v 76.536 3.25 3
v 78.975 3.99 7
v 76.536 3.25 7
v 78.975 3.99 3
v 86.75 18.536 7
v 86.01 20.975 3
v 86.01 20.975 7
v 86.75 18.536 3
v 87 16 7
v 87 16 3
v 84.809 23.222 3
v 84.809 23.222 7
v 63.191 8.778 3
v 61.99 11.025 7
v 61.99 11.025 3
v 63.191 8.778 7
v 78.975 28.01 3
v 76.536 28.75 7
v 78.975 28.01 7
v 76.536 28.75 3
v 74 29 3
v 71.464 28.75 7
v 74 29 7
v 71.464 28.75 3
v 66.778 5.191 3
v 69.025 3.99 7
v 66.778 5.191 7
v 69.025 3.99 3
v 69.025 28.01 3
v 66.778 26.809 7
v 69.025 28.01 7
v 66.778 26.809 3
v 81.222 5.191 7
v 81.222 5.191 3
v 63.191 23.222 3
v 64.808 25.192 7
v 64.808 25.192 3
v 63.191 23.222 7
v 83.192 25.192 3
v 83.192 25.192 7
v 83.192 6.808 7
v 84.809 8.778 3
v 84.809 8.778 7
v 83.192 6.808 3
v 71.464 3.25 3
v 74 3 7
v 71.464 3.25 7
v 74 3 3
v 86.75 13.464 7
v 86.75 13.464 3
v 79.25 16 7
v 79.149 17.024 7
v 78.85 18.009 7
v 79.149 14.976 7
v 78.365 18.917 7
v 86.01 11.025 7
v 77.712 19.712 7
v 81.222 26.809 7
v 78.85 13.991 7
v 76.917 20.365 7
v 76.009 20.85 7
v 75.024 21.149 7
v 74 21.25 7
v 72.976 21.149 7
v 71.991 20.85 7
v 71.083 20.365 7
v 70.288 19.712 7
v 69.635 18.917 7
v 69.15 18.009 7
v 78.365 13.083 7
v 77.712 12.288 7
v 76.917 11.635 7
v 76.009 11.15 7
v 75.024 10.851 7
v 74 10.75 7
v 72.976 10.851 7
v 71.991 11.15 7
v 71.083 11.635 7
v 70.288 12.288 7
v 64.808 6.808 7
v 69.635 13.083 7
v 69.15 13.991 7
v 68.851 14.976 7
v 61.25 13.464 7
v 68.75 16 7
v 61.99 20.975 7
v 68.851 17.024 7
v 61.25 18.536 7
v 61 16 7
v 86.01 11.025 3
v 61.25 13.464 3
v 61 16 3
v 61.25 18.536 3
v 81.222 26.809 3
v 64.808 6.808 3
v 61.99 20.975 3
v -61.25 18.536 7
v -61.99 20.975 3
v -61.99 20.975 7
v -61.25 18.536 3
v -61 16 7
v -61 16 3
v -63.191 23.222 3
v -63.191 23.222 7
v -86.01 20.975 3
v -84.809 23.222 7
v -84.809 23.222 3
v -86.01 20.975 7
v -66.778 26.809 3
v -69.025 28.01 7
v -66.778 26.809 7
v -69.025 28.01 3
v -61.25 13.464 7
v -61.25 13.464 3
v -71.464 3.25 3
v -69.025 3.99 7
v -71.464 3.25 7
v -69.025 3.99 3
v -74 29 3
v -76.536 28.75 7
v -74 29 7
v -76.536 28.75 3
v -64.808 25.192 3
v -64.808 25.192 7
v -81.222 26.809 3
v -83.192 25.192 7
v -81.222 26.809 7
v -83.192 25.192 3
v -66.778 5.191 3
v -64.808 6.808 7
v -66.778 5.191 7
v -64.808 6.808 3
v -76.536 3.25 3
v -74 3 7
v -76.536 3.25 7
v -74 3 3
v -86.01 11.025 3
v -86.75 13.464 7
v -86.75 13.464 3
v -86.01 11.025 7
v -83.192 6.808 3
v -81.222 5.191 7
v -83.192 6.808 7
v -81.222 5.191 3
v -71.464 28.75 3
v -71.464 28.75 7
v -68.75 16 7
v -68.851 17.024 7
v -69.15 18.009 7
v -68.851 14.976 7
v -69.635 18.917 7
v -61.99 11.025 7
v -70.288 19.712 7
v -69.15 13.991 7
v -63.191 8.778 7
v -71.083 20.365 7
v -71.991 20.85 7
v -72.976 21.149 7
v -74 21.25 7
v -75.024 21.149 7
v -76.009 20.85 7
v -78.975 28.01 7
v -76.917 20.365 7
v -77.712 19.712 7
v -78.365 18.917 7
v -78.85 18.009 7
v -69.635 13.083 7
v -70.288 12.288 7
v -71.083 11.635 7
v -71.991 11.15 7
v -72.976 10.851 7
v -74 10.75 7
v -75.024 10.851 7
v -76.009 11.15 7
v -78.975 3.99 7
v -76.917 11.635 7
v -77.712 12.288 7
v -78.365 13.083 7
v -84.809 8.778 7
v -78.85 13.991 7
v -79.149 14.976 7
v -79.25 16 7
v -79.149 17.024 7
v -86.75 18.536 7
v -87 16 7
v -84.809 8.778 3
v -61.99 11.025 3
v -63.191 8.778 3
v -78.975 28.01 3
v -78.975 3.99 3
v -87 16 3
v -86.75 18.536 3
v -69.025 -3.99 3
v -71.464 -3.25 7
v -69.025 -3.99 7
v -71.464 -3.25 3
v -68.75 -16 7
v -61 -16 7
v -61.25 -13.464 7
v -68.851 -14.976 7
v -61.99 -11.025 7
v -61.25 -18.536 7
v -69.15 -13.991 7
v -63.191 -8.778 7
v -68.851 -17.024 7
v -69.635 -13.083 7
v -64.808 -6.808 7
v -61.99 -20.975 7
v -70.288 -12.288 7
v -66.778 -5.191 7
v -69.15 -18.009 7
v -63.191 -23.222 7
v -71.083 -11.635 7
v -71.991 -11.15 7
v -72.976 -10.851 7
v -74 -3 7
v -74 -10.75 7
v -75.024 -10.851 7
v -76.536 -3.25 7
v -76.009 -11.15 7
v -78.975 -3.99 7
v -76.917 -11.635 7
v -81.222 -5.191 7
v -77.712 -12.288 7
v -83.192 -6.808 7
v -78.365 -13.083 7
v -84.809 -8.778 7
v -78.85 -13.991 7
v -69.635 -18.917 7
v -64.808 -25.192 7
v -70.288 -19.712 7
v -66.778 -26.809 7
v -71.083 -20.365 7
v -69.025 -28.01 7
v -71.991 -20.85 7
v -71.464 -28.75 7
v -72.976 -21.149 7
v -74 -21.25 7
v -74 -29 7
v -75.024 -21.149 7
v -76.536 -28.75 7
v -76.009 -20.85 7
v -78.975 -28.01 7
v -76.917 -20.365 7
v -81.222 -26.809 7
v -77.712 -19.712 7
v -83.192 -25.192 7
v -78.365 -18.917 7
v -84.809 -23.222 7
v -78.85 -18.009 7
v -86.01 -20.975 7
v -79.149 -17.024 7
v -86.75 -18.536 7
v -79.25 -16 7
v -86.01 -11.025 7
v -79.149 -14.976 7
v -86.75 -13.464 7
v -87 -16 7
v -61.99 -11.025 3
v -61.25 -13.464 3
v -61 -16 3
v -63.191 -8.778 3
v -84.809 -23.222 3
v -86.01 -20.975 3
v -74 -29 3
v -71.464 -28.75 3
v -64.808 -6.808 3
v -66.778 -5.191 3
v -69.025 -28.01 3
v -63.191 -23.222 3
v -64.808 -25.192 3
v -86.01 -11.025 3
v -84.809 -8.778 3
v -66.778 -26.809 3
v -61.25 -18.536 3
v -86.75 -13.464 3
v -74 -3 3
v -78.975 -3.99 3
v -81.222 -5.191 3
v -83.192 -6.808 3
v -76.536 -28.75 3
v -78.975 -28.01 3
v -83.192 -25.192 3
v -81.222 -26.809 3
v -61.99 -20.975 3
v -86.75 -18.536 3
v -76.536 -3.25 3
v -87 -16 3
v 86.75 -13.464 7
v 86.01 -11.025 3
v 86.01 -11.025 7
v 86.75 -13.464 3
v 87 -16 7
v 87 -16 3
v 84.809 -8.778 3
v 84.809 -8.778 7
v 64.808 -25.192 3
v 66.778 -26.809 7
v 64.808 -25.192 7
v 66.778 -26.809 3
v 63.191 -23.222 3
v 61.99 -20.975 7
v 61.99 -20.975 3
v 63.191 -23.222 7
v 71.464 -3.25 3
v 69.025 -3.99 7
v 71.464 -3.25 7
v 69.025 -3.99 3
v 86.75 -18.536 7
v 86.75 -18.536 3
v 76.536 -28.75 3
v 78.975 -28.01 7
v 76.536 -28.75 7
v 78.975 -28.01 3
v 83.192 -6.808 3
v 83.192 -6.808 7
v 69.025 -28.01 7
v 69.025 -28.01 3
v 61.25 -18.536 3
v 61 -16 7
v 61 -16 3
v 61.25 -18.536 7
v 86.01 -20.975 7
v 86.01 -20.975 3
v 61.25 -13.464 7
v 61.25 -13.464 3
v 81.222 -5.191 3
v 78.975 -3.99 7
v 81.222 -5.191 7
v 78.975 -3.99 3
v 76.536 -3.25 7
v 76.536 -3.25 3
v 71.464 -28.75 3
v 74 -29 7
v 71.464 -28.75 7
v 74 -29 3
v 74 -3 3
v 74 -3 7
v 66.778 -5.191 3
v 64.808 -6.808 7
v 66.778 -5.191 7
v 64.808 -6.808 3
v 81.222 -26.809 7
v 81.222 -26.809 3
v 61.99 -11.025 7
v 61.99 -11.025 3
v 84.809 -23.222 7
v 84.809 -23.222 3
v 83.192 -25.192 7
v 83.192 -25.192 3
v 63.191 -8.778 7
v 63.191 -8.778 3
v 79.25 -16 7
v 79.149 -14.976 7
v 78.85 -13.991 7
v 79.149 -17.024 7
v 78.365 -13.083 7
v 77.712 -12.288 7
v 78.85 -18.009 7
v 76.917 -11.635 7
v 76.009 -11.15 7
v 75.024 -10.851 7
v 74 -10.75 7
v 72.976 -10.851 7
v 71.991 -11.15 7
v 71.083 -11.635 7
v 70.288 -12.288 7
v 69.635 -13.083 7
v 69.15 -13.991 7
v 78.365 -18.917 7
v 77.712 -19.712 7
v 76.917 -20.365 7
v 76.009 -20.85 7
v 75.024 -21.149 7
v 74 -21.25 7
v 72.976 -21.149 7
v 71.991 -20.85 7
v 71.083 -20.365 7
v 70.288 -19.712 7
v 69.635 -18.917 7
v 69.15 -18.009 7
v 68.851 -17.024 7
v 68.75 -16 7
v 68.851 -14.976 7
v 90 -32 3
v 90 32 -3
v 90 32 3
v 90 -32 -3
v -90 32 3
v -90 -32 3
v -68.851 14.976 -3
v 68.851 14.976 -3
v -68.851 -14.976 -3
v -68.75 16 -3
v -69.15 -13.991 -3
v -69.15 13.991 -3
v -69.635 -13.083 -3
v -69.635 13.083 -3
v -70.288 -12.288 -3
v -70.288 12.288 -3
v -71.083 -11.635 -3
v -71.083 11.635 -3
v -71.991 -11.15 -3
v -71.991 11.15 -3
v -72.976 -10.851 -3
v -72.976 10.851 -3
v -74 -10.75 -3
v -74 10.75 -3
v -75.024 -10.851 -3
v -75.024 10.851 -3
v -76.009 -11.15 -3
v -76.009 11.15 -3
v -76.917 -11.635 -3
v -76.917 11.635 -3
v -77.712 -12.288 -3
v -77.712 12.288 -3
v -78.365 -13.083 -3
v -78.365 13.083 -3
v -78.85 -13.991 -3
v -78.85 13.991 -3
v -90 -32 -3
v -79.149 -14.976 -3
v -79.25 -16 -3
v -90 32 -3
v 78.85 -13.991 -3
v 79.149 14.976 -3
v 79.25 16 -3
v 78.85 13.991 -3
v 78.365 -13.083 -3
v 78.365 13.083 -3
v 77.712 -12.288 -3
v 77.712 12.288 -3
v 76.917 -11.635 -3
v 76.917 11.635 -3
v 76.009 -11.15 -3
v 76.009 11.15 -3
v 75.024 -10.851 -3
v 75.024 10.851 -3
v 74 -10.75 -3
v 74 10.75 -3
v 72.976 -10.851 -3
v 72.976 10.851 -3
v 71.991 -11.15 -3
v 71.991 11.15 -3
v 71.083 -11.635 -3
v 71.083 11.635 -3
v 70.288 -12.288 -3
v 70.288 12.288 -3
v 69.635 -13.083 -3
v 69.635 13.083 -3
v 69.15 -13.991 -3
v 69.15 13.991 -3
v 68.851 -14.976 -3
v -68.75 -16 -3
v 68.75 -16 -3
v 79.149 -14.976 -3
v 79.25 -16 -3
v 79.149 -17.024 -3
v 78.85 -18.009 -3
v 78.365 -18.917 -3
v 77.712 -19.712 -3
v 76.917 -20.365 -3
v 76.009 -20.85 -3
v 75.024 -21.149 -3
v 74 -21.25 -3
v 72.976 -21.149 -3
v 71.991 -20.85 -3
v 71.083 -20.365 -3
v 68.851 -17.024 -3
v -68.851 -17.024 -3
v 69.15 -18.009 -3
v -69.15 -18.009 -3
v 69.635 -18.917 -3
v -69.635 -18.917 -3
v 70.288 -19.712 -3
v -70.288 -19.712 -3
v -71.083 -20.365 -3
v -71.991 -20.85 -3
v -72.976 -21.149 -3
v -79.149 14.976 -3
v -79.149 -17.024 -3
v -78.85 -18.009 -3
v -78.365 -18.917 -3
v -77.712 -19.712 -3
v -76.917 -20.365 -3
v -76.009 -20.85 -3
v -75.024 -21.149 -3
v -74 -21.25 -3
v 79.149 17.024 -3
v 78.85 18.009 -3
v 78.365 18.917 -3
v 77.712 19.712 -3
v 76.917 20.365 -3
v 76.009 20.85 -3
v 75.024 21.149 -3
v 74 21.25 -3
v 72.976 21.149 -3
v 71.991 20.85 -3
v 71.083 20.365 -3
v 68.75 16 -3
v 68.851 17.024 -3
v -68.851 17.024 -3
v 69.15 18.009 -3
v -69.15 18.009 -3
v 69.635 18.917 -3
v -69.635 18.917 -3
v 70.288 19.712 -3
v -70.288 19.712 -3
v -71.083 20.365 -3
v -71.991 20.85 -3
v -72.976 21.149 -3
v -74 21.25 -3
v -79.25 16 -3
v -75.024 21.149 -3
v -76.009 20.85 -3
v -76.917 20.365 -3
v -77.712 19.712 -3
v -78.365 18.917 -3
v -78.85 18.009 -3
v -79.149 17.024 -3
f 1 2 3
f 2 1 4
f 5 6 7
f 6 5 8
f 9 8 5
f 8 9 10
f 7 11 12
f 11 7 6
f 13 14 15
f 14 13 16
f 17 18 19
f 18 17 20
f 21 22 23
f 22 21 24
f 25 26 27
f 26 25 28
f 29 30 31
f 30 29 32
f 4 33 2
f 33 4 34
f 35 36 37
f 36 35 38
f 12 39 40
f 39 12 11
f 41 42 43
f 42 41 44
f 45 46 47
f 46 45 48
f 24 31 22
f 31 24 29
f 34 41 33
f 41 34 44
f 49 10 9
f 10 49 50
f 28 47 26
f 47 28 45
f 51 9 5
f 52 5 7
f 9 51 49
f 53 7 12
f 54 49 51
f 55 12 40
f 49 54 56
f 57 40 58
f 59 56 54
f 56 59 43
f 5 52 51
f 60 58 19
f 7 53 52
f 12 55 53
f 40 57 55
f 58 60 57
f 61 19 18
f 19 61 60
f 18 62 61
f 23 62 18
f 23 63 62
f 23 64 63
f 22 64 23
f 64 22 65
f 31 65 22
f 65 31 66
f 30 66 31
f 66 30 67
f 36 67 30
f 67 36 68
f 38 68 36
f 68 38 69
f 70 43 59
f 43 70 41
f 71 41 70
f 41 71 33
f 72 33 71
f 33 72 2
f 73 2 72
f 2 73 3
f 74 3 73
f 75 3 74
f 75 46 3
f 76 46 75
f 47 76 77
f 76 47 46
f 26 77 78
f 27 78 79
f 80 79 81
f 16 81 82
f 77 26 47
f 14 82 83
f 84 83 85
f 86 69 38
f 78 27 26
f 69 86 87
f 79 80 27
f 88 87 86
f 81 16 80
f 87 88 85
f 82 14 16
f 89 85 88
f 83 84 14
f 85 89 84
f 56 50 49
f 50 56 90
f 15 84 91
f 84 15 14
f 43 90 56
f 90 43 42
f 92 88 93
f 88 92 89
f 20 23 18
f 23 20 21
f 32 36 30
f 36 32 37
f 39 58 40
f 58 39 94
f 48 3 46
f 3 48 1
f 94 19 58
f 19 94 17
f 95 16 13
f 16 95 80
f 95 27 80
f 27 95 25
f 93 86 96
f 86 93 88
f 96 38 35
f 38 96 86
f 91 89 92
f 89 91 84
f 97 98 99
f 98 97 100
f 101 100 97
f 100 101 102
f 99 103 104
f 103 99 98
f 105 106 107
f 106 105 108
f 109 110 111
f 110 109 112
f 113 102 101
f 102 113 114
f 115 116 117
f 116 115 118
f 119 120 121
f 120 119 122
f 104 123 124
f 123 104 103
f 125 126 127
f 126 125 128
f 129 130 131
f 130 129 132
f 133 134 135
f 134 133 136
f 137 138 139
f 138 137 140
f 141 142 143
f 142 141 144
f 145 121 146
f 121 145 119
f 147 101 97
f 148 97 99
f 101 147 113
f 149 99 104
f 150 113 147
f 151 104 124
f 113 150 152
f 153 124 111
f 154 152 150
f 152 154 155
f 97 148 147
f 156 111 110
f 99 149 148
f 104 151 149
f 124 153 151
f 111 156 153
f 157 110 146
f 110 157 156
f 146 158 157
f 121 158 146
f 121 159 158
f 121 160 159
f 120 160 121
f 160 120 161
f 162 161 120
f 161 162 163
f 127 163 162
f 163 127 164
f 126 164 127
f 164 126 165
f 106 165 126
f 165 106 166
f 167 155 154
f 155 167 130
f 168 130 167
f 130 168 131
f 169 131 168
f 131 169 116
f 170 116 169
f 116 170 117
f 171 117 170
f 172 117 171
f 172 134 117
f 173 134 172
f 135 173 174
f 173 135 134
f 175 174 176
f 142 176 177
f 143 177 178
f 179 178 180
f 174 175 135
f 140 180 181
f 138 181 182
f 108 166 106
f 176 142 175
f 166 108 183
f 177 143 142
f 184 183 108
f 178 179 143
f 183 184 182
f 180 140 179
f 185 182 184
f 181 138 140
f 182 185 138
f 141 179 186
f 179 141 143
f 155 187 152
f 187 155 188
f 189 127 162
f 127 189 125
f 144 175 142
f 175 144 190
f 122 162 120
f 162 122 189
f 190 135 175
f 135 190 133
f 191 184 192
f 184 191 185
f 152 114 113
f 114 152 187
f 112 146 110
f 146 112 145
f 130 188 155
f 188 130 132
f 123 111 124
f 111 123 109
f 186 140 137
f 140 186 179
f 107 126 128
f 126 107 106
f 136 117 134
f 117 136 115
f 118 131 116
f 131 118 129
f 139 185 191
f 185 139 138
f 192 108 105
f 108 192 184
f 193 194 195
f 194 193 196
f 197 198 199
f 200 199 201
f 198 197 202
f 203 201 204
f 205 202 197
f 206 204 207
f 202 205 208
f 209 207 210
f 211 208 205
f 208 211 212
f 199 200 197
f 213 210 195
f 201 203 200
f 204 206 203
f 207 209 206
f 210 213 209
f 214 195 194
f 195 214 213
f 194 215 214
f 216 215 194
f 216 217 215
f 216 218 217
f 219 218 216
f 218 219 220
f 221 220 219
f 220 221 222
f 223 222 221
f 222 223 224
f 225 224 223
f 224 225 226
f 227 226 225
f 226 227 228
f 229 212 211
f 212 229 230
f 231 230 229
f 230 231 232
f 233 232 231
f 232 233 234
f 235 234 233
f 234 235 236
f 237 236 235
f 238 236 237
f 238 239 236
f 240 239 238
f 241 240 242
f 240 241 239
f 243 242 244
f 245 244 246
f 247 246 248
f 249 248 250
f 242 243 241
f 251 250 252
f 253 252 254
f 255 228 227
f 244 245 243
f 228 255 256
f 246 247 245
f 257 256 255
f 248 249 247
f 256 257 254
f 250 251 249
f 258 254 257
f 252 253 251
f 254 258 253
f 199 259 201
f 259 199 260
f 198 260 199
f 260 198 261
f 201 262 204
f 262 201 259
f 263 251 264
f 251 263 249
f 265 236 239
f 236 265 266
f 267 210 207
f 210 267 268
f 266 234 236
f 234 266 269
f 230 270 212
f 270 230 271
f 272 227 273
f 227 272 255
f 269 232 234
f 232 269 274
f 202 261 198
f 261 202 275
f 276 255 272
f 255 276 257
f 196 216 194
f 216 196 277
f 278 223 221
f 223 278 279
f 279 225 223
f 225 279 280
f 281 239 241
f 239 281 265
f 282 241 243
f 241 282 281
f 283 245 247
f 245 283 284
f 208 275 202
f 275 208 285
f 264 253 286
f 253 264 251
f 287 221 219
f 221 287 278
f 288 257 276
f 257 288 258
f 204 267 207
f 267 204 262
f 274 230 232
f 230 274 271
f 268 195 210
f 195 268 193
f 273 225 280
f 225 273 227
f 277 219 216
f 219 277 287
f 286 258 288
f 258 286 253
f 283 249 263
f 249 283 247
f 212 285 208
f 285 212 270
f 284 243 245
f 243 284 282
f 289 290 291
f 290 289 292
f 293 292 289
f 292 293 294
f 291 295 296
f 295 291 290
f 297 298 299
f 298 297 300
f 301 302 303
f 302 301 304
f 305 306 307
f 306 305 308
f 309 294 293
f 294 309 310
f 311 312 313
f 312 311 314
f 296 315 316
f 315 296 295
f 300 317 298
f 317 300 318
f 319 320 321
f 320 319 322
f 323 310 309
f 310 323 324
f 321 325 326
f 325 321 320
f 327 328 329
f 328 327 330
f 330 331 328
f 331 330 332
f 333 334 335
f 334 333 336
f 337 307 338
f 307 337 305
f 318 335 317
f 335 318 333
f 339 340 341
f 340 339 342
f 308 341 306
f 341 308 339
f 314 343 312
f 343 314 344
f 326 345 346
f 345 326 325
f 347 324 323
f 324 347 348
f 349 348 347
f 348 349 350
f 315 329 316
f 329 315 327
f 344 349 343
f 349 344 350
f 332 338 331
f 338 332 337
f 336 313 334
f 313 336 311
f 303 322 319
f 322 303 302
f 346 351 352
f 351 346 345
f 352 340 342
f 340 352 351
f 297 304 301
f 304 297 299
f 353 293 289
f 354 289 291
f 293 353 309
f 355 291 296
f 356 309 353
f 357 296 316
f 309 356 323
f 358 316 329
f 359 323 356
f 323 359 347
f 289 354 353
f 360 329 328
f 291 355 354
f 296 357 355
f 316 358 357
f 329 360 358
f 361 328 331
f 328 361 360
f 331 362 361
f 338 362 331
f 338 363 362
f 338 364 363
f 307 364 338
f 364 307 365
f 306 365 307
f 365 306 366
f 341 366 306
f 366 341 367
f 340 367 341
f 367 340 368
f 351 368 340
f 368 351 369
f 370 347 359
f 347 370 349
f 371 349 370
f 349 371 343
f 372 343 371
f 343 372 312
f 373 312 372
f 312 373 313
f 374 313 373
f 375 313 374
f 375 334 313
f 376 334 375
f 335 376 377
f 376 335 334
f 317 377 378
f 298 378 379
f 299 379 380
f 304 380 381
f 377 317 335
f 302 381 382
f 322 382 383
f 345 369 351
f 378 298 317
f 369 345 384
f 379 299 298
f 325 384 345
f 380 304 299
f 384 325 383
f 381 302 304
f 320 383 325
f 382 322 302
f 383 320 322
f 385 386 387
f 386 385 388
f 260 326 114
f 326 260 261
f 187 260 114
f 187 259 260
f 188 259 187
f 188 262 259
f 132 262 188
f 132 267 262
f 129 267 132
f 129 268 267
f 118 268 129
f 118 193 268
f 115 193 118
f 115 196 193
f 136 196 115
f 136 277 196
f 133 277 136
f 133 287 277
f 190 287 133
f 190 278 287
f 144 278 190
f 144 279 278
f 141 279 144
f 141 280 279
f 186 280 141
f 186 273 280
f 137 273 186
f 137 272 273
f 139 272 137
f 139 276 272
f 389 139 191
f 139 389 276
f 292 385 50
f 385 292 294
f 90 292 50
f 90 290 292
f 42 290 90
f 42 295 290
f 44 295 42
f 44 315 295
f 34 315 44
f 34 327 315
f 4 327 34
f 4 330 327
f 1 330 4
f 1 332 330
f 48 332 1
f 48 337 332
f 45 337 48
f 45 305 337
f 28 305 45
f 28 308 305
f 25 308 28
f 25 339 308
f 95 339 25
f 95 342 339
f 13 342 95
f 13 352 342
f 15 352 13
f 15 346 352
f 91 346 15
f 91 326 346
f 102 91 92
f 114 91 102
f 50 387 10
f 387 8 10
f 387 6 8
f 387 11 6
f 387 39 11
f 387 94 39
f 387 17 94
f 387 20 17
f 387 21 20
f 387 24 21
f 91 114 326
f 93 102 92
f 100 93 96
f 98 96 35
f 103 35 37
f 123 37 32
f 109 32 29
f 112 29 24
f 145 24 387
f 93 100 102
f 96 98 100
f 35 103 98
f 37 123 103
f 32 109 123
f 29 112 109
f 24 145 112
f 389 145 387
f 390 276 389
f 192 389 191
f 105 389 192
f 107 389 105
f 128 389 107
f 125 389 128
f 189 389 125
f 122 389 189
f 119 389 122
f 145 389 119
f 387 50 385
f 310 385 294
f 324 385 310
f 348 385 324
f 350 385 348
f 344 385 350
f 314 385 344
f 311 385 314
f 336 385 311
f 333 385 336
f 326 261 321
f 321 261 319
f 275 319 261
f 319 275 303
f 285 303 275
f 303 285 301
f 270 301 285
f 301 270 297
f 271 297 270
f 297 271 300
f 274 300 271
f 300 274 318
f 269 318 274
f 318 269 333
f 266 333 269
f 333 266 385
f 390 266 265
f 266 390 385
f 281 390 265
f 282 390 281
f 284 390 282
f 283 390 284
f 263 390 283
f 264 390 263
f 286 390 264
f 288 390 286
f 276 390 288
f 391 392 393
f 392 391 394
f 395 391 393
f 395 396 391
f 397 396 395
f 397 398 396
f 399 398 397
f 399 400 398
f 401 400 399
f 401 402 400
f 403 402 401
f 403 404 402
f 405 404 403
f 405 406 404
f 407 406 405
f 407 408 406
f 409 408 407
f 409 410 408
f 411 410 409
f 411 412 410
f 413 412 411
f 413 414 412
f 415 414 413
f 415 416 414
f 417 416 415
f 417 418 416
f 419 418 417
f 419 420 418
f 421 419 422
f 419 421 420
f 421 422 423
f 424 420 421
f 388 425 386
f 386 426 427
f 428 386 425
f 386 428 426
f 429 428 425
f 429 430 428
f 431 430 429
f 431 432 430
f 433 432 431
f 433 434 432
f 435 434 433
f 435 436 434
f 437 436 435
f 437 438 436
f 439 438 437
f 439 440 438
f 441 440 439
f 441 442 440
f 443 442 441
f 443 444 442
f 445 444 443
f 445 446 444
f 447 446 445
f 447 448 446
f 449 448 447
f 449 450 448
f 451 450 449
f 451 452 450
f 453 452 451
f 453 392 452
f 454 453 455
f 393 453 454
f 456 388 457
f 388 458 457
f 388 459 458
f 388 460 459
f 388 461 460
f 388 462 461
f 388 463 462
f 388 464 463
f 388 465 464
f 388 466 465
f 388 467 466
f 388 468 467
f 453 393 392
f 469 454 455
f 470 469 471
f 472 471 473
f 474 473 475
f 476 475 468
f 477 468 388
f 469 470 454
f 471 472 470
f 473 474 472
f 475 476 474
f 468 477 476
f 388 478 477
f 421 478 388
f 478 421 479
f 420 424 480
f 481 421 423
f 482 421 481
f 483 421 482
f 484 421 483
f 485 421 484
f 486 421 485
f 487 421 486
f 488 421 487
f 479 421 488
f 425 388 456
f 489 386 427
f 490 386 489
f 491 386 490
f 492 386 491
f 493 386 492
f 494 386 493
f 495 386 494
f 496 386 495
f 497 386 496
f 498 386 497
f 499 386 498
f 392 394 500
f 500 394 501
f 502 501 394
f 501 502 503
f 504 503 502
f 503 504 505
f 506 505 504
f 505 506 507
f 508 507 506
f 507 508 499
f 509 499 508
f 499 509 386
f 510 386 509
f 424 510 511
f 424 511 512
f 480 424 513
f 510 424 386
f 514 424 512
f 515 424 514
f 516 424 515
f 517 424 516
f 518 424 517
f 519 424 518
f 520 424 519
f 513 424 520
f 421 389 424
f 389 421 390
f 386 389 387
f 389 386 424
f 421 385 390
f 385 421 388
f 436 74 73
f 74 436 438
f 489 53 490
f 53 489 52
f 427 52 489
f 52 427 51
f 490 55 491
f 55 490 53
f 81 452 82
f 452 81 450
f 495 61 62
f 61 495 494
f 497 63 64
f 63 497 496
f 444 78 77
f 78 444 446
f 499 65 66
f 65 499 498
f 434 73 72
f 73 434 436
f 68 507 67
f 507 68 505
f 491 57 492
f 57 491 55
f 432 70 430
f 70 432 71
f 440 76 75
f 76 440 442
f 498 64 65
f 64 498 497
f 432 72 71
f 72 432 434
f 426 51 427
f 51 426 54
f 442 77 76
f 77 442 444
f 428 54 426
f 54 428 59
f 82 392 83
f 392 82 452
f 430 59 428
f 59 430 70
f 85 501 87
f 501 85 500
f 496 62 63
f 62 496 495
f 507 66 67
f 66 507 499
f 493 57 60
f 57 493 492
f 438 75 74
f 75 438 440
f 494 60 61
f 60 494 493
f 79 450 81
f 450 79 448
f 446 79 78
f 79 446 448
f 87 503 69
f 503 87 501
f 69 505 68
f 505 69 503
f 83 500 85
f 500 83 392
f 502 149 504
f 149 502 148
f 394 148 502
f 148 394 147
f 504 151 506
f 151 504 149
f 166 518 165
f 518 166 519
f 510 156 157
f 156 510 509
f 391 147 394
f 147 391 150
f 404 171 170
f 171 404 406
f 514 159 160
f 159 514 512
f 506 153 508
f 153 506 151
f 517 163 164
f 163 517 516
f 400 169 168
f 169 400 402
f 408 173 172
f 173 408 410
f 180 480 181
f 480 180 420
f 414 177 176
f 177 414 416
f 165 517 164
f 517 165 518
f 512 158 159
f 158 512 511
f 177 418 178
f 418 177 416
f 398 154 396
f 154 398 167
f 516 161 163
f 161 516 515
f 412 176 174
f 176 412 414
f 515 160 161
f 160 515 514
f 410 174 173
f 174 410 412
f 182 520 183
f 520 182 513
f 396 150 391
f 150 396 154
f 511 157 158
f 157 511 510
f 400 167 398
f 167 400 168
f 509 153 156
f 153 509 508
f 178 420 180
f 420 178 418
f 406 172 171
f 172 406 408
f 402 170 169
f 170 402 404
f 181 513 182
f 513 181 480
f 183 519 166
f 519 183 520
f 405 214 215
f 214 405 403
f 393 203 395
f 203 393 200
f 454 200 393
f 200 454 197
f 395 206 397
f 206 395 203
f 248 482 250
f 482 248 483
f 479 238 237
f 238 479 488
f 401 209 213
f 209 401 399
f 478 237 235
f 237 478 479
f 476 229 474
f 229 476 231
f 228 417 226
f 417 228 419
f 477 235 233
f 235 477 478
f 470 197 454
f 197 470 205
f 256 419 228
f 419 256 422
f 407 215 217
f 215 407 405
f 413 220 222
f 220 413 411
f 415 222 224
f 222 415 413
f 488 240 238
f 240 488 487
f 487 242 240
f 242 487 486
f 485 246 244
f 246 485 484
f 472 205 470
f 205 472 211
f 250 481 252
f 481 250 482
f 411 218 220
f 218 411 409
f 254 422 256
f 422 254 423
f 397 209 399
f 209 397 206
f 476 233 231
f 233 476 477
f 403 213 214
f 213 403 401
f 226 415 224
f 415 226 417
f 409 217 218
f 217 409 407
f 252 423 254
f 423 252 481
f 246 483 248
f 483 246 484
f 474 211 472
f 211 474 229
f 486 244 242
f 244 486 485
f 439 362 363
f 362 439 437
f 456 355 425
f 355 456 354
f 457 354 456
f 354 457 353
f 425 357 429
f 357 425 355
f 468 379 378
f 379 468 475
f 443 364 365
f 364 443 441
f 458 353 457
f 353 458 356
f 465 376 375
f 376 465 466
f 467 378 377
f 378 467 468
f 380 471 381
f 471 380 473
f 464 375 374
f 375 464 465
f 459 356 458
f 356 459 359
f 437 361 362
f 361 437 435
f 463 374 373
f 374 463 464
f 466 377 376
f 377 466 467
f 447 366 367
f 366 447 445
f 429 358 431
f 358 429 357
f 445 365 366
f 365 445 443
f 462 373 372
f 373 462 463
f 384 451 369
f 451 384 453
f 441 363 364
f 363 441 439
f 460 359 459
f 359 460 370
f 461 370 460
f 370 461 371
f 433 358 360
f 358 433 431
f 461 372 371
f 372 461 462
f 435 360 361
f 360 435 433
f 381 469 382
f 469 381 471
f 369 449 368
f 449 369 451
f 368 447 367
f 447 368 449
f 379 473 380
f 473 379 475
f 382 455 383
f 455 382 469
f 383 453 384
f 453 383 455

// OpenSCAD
$fn = 32;

// ----------------------------------------------------------------------
// Anchor pads 180 x 64 x 10
// four corner bosses with anchor holes
// ----------------------------------------------------------------------

// --- parameters (mm) ---
plate = [180, 64, 6];  // base plate size (x, y, z)
pads = 4;              // boss count, one per corner
edge = 16;             // boss centre offset from the plate edge
boss_d = 26;           // boss diameter
boss_h = 4;            // boss height above the base plate
hole_d = 10.5;         // hole diameter

// --- derived feature positions (mm) ---
height = plate[2] + boss_h;      // = 10   overall height of the part
corner_x = plate[0] / 2 - edge;  // = 74   boss centre X
corner_y = plate[1] / 2 - edge;  // = 16   boss centre Y
feature_centers = [
  [corner_x, corner_y],
  [-corner_x, corner_y],
  [-corner_x, -corner_y],
  [corner_x, -corner_y]
];   // boss centres, anchor holes are drilled there

// base plate, four bosses standing on it, anchor holes all the way through
difference() {
  union() {
    cube(plate, center = true);
    for (centre = feature_centers)
      translate([centre[0], centre[1], plate[2] / 2 - 1])
        cylinder(d = boss_d, h = boss_h + 1);
  }
  for (centre = feature_centers)
    translate([centre[0], centre[1], -height])
      cylinder(d = hole_d, h = 2 * height + 2);  // through boss and plate
}
